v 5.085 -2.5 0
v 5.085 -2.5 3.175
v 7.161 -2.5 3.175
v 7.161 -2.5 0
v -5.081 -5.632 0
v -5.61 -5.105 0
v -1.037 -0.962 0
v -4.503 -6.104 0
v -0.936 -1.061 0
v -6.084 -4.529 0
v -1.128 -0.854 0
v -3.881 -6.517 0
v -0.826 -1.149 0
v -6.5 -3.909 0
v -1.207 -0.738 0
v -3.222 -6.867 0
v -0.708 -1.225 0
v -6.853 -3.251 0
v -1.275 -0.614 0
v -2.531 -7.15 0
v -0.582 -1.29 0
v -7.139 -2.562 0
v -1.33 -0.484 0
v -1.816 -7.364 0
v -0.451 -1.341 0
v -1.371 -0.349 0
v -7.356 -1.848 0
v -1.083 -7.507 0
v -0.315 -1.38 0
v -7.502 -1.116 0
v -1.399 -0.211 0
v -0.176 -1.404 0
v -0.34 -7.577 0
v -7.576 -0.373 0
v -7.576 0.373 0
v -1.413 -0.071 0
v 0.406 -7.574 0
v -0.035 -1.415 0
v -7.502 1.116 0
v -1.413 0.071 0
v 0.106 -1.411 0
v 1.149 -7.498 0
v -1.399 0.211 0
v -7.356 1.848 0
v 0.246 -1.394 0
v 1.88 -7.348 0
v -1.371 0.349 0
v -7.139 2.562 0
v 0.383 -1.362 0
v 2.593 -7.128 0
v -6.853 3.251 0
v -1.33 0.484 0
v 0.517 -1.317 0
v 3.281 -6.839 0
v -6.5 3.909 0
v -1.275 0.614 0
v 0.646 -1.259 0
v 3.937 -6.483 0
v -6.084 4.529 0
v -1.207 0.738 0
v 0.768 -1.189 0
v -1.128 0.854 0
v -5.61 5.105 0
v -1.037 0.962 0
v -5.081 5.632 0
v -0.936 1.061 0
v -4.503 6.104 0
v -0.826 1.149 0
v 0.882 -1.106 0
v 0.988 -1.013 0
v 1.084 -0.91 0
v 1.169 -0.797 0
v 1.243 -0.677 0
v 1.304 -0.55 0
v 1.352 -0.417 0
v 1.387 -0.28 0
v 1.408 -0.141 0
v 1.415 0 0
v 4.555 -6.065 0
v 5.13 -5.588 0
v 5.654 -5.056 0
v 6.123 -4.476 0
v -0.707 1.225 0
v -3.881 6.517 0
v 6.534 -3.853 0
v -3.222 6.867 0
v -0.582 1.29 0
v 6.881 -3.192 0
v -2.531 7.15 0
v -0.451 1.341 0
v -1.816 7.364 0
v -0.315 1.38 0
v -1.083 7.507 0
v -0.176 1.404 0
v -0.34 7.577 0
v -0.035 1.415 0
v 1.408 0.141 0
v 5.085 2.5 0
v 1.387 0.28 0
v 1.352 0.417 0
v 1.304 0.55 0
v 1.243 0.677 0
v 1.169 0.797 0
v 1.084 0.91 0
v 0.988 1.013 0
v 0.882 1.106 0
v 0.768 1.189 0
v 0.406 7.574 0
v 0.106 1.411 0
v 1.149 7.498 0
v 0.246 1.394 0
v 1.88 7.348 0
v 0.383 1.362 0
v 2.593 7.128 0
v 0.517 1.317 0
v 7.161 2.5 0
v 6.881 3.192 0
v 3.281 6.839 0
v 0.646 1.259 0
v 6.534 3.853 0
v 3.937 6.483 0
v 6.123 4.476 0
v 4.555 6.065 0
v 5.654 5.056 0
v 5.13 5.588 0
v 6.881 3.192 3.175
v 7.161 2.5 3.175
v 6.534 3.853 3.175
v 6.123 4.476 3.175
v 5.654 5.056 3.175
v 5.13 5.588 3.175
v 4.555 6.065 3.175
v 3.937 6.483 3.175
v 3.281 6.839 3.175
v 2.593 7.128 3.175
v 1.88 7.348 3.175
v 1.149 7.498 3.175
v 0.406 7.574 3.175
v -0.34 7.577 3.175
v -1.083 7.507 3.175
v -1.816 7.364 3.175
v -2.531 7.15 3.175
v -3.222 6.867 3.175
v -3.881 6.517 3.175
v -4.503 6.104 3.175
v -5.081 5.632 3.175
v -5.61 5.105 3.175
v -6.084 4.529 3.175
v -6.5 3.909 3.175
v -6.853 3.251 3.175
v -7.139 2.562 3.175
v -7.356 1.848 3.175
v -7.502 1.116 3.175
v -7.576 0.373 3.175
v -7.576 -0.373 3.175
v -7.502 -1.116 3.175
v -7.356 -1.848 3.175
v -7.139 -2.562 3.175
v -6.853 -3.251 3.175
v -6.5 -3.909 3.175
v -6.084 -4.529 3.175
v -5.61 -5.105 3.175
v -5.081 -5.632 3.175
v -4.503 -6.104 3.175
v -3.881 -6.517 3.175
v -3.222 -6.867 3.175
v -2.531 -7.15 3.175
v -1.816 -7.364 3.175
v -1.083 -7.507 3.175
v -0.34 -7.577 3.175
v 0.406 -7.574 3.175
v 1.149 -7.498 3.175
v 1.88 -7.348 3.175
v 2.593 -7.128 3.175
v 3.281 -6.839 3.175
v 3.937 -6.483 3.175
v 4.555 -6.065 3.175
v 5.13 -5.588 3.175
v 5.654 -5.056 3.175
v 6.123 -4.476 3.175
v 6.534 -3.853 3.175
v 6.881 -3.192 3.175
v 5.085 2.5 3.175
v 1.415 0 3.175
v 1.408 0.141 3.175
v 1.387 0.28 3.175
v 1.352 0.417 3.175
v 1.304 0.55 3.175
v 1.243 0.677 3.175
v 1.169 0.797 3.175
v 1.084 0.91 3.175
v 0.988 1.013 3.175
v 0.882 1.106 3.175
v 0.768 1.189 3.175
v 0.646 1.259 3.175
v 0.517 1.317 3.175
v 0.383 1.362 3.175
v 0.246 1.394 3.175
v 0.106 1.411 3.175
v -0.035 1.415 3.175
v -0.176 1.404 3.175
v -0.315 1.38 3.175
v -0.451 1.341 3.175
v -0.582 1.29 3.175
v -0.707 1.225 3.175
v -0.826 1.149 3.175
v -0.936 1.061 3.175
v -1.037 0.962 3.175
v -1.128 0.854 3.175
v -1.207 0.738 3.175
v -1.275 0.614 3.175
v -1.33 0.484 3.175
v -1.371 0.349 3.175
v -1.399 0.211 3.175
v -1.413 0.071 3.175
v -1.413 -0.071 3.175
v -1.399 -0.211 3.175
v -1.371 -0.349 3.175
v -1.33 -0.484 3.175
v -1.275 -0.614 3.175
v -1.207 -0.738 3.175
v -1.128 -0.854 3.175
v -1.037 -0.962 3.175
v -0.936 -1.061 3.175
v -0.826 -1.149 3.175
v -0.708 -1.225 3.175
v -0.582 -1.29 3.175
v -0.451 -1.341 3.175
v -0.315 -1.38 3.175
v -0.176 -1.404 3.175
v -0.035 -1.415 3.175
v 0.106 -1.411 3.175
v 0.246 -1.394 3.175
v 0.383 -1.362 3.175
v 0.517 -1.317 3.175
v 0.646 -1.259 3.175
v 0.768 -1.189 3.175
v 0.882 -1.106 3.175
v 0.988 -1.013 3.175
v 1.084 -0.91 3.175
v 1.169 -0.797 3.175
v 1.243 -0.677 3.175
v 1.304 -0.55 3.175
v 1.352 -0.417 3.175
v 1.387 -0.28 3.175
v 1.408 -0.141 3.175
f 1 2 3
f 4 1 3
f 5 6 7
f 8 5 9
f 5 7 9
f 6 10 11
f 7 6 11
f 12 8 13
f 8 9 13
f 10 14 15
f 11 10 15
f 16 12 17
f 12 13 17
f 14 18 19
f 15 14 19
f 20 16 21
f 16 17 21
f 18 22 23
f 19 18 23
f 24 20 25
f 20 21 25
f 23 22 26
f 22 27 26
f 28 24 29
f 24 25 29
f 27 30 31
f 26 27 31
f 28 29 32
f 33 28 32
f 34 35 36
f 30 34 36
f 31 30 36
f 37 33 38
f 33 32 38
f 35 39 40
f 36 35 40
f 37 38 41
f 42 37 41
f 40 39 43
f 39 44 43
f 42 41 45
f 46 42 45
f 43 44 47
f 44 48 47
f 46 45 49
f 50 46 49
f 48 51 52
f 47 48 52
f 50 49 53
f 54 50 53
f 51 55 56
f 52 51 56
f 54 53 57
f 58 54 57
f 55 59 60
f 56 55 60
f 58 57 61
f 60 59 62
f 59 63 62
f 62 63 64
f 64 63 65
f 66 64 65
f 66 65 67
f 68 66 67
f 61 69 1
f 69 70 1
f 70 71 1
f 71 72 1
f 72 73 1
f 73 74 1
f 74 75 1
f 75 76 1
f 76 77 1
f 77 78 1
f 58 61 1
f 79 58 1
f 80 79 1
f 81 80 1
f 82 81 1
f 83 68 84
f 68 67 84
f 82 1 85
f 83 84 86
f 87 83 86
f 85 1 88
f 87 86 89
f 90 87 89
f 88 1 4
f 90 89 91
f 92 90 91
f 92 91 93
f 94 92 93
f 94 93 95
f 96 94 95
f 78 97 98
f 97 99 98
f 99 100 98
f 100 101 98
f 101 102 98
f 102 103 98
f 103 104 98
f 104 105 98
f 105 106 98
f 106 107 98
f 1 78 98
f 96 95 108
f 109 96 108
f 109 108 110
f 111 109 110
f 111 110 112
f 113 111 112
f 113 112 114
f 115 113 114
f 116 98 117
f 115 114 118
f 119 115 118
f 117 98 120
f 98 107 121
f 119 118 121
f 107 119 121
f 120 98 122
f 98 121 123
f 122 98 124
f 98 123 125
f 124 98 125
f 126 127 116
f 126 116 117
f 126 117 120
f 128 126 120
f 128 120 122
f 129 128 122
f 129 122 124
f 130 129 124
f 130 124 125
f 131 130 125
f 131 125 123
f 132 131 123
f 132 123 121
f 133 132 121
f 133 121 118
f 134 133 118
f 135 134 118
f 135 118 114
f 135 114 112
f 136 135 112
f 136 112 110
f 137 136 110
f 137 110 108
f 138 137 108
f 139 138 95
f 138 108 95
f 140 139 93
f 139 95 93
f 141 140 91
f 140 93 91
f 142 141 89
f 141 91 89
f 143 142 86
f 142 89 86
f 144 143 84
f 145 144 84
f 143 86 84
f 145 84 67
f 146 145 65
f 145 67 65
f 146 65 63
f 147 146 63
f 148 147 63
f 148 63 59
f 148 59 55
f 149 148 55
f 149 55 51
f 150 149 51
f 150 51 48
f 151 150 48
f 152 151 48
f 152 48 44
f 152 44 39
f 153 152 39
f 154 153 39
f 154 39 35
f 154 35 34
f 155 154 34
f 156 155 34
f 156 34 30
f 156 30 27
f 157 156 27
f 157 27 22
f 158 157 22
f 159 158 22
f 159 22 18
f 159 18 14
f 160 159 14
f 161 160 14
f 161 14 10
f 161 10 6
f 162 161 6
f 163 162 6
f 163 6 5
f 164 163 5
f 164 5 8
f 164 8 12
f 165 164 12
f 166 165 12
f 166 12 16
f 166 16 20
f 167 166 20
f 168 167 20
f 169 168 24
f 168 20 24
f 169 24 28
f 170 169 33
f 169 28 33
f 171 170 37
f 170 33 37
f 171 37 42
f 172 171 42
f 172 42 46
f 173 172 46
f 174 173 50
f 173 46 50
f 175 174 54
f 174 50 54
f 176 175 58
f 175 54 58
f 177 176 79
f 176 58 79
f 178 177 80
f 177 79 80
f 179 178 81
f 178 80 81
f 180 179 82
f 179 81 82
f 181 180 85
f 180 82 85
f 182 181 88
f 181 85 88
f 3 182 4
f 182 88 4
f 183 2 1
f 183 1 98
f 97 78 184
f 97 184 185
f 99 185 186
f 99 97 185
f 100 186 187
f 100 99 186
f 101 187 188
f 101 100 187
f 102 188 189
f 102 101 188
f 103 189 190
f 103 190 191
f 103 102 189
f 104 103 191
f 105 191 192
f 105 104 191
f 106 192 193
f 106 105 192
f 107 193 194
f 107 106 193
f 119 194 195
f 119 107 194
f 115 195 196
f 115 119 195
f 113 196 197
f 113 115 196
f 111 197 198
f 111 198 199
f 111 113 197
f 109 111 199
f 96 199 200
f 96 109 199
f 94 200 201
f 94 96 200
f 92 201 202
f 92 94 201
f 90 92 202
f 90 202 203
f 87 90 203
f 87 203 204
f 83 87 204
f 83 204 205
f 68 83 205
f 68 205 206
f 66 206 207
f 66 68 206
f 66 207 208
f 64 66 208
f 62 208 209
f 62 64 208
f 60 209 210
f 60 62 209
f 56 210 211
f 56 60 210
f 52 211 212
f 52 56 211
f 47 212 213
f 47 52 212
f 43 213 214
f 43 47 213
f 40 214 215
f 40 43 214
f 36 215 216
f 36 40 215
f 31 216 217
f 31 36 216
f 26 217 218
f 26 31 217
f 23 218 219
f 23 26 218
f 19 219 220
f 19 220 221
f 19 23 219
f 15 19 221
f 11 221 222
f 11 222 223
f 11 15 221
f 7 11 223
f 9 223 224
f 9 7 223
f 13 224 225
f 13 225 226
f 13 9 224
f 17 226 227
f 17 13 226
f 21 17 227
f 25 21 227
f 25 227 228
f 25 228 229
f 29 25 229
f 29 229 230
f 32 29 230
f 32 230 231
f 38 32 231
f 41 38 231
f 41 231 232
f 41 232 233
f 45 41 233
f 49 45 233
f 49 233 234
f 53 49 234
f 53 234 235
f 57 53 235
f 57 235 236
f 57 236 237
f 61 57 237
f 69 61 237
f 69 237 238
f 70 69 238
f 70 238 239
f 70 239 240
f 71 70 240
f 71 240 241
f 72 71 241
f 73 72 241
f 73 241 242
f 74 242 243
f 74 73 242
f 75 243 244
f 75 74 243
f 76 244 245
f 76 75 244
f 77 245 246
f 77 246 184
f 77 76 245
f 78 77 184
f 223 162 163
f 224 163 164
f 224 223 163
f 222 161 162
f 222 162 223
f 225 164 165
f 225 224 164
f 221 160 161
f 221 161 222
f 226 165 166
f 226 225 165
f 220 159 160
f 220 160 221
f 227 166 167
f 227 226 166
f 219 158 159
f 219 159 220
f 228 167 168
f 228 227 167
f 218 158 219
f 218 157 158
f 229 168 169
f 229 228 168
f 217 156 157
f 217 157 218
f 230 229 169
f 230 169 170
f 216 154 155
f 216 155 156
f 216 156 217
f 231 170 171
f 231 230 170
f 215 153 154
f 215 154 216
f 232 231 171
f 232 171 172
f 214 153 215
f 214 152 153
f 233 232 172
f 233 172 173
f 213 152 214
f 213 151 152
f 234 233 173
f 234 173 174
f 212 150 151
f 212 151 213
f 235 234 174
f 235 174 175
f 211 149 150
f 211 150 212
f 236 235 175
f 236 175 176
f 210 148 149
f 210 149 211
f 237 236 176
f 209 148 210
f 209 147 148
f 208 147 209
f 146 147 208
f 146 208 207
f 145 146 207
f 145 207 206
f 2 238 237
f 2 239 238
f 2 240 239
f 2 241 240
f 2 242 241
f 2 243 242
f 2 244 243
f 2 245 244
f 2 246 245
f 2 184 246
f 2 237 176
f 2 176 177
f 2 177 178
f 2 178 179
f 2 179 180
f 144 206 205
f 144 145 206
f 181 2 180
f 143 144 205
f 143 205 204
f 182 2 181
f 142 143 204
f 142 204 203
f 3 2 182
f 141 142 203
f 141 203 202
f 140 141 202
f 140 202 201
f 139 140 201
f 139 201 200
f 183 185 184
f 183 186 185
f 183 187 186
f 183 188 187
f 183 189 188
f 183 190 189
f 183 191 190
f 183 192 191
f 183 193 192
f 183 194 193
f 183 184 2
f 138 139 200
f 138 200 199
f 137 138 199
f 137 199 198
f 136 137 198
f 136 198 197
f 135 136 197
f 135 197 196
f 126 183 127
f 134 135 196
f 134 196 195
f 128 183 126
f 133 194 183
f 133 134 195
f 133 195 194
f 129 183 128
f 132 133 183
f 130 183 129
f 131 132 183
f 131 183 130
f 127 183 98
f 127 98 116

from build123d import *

# Parameters (mm, degrees)
SKETCH1_R           = 7.585
SKETCH1_R_2         = 1.415
BOSS_EXTRUDE1_DEPTH = 3.175
SKETCH2_W           = 2.5
SKETCH2_H           = 5
CUT_EXTRUDE1_DEPTH  = 3.175


with BuildPart() as part:
    # Sketch1 → Boss-Extrude1 (new body)
    with BuildSketch(Plane.XY):
        Circle(SKETCH1_R)
        Circle(SKETCH1_R_2, mode=Mode.SUBTRACT)
    extrude(amount=BOSS_EXTRUDE1_DEPTH)

    # Sketch2 → Cut-Extrude1 (cut)
    with BuildSketch(Plane.XY.offset(3.175)):
        with Locations((6.335, 0)):
            Rectangle(SKETCH2_W, SKETCH2_H)
    extrude(amount=-CUT_EXTRUDE1_DEPTH, mode=Mode.SUBTRACT)


solid = part.part
